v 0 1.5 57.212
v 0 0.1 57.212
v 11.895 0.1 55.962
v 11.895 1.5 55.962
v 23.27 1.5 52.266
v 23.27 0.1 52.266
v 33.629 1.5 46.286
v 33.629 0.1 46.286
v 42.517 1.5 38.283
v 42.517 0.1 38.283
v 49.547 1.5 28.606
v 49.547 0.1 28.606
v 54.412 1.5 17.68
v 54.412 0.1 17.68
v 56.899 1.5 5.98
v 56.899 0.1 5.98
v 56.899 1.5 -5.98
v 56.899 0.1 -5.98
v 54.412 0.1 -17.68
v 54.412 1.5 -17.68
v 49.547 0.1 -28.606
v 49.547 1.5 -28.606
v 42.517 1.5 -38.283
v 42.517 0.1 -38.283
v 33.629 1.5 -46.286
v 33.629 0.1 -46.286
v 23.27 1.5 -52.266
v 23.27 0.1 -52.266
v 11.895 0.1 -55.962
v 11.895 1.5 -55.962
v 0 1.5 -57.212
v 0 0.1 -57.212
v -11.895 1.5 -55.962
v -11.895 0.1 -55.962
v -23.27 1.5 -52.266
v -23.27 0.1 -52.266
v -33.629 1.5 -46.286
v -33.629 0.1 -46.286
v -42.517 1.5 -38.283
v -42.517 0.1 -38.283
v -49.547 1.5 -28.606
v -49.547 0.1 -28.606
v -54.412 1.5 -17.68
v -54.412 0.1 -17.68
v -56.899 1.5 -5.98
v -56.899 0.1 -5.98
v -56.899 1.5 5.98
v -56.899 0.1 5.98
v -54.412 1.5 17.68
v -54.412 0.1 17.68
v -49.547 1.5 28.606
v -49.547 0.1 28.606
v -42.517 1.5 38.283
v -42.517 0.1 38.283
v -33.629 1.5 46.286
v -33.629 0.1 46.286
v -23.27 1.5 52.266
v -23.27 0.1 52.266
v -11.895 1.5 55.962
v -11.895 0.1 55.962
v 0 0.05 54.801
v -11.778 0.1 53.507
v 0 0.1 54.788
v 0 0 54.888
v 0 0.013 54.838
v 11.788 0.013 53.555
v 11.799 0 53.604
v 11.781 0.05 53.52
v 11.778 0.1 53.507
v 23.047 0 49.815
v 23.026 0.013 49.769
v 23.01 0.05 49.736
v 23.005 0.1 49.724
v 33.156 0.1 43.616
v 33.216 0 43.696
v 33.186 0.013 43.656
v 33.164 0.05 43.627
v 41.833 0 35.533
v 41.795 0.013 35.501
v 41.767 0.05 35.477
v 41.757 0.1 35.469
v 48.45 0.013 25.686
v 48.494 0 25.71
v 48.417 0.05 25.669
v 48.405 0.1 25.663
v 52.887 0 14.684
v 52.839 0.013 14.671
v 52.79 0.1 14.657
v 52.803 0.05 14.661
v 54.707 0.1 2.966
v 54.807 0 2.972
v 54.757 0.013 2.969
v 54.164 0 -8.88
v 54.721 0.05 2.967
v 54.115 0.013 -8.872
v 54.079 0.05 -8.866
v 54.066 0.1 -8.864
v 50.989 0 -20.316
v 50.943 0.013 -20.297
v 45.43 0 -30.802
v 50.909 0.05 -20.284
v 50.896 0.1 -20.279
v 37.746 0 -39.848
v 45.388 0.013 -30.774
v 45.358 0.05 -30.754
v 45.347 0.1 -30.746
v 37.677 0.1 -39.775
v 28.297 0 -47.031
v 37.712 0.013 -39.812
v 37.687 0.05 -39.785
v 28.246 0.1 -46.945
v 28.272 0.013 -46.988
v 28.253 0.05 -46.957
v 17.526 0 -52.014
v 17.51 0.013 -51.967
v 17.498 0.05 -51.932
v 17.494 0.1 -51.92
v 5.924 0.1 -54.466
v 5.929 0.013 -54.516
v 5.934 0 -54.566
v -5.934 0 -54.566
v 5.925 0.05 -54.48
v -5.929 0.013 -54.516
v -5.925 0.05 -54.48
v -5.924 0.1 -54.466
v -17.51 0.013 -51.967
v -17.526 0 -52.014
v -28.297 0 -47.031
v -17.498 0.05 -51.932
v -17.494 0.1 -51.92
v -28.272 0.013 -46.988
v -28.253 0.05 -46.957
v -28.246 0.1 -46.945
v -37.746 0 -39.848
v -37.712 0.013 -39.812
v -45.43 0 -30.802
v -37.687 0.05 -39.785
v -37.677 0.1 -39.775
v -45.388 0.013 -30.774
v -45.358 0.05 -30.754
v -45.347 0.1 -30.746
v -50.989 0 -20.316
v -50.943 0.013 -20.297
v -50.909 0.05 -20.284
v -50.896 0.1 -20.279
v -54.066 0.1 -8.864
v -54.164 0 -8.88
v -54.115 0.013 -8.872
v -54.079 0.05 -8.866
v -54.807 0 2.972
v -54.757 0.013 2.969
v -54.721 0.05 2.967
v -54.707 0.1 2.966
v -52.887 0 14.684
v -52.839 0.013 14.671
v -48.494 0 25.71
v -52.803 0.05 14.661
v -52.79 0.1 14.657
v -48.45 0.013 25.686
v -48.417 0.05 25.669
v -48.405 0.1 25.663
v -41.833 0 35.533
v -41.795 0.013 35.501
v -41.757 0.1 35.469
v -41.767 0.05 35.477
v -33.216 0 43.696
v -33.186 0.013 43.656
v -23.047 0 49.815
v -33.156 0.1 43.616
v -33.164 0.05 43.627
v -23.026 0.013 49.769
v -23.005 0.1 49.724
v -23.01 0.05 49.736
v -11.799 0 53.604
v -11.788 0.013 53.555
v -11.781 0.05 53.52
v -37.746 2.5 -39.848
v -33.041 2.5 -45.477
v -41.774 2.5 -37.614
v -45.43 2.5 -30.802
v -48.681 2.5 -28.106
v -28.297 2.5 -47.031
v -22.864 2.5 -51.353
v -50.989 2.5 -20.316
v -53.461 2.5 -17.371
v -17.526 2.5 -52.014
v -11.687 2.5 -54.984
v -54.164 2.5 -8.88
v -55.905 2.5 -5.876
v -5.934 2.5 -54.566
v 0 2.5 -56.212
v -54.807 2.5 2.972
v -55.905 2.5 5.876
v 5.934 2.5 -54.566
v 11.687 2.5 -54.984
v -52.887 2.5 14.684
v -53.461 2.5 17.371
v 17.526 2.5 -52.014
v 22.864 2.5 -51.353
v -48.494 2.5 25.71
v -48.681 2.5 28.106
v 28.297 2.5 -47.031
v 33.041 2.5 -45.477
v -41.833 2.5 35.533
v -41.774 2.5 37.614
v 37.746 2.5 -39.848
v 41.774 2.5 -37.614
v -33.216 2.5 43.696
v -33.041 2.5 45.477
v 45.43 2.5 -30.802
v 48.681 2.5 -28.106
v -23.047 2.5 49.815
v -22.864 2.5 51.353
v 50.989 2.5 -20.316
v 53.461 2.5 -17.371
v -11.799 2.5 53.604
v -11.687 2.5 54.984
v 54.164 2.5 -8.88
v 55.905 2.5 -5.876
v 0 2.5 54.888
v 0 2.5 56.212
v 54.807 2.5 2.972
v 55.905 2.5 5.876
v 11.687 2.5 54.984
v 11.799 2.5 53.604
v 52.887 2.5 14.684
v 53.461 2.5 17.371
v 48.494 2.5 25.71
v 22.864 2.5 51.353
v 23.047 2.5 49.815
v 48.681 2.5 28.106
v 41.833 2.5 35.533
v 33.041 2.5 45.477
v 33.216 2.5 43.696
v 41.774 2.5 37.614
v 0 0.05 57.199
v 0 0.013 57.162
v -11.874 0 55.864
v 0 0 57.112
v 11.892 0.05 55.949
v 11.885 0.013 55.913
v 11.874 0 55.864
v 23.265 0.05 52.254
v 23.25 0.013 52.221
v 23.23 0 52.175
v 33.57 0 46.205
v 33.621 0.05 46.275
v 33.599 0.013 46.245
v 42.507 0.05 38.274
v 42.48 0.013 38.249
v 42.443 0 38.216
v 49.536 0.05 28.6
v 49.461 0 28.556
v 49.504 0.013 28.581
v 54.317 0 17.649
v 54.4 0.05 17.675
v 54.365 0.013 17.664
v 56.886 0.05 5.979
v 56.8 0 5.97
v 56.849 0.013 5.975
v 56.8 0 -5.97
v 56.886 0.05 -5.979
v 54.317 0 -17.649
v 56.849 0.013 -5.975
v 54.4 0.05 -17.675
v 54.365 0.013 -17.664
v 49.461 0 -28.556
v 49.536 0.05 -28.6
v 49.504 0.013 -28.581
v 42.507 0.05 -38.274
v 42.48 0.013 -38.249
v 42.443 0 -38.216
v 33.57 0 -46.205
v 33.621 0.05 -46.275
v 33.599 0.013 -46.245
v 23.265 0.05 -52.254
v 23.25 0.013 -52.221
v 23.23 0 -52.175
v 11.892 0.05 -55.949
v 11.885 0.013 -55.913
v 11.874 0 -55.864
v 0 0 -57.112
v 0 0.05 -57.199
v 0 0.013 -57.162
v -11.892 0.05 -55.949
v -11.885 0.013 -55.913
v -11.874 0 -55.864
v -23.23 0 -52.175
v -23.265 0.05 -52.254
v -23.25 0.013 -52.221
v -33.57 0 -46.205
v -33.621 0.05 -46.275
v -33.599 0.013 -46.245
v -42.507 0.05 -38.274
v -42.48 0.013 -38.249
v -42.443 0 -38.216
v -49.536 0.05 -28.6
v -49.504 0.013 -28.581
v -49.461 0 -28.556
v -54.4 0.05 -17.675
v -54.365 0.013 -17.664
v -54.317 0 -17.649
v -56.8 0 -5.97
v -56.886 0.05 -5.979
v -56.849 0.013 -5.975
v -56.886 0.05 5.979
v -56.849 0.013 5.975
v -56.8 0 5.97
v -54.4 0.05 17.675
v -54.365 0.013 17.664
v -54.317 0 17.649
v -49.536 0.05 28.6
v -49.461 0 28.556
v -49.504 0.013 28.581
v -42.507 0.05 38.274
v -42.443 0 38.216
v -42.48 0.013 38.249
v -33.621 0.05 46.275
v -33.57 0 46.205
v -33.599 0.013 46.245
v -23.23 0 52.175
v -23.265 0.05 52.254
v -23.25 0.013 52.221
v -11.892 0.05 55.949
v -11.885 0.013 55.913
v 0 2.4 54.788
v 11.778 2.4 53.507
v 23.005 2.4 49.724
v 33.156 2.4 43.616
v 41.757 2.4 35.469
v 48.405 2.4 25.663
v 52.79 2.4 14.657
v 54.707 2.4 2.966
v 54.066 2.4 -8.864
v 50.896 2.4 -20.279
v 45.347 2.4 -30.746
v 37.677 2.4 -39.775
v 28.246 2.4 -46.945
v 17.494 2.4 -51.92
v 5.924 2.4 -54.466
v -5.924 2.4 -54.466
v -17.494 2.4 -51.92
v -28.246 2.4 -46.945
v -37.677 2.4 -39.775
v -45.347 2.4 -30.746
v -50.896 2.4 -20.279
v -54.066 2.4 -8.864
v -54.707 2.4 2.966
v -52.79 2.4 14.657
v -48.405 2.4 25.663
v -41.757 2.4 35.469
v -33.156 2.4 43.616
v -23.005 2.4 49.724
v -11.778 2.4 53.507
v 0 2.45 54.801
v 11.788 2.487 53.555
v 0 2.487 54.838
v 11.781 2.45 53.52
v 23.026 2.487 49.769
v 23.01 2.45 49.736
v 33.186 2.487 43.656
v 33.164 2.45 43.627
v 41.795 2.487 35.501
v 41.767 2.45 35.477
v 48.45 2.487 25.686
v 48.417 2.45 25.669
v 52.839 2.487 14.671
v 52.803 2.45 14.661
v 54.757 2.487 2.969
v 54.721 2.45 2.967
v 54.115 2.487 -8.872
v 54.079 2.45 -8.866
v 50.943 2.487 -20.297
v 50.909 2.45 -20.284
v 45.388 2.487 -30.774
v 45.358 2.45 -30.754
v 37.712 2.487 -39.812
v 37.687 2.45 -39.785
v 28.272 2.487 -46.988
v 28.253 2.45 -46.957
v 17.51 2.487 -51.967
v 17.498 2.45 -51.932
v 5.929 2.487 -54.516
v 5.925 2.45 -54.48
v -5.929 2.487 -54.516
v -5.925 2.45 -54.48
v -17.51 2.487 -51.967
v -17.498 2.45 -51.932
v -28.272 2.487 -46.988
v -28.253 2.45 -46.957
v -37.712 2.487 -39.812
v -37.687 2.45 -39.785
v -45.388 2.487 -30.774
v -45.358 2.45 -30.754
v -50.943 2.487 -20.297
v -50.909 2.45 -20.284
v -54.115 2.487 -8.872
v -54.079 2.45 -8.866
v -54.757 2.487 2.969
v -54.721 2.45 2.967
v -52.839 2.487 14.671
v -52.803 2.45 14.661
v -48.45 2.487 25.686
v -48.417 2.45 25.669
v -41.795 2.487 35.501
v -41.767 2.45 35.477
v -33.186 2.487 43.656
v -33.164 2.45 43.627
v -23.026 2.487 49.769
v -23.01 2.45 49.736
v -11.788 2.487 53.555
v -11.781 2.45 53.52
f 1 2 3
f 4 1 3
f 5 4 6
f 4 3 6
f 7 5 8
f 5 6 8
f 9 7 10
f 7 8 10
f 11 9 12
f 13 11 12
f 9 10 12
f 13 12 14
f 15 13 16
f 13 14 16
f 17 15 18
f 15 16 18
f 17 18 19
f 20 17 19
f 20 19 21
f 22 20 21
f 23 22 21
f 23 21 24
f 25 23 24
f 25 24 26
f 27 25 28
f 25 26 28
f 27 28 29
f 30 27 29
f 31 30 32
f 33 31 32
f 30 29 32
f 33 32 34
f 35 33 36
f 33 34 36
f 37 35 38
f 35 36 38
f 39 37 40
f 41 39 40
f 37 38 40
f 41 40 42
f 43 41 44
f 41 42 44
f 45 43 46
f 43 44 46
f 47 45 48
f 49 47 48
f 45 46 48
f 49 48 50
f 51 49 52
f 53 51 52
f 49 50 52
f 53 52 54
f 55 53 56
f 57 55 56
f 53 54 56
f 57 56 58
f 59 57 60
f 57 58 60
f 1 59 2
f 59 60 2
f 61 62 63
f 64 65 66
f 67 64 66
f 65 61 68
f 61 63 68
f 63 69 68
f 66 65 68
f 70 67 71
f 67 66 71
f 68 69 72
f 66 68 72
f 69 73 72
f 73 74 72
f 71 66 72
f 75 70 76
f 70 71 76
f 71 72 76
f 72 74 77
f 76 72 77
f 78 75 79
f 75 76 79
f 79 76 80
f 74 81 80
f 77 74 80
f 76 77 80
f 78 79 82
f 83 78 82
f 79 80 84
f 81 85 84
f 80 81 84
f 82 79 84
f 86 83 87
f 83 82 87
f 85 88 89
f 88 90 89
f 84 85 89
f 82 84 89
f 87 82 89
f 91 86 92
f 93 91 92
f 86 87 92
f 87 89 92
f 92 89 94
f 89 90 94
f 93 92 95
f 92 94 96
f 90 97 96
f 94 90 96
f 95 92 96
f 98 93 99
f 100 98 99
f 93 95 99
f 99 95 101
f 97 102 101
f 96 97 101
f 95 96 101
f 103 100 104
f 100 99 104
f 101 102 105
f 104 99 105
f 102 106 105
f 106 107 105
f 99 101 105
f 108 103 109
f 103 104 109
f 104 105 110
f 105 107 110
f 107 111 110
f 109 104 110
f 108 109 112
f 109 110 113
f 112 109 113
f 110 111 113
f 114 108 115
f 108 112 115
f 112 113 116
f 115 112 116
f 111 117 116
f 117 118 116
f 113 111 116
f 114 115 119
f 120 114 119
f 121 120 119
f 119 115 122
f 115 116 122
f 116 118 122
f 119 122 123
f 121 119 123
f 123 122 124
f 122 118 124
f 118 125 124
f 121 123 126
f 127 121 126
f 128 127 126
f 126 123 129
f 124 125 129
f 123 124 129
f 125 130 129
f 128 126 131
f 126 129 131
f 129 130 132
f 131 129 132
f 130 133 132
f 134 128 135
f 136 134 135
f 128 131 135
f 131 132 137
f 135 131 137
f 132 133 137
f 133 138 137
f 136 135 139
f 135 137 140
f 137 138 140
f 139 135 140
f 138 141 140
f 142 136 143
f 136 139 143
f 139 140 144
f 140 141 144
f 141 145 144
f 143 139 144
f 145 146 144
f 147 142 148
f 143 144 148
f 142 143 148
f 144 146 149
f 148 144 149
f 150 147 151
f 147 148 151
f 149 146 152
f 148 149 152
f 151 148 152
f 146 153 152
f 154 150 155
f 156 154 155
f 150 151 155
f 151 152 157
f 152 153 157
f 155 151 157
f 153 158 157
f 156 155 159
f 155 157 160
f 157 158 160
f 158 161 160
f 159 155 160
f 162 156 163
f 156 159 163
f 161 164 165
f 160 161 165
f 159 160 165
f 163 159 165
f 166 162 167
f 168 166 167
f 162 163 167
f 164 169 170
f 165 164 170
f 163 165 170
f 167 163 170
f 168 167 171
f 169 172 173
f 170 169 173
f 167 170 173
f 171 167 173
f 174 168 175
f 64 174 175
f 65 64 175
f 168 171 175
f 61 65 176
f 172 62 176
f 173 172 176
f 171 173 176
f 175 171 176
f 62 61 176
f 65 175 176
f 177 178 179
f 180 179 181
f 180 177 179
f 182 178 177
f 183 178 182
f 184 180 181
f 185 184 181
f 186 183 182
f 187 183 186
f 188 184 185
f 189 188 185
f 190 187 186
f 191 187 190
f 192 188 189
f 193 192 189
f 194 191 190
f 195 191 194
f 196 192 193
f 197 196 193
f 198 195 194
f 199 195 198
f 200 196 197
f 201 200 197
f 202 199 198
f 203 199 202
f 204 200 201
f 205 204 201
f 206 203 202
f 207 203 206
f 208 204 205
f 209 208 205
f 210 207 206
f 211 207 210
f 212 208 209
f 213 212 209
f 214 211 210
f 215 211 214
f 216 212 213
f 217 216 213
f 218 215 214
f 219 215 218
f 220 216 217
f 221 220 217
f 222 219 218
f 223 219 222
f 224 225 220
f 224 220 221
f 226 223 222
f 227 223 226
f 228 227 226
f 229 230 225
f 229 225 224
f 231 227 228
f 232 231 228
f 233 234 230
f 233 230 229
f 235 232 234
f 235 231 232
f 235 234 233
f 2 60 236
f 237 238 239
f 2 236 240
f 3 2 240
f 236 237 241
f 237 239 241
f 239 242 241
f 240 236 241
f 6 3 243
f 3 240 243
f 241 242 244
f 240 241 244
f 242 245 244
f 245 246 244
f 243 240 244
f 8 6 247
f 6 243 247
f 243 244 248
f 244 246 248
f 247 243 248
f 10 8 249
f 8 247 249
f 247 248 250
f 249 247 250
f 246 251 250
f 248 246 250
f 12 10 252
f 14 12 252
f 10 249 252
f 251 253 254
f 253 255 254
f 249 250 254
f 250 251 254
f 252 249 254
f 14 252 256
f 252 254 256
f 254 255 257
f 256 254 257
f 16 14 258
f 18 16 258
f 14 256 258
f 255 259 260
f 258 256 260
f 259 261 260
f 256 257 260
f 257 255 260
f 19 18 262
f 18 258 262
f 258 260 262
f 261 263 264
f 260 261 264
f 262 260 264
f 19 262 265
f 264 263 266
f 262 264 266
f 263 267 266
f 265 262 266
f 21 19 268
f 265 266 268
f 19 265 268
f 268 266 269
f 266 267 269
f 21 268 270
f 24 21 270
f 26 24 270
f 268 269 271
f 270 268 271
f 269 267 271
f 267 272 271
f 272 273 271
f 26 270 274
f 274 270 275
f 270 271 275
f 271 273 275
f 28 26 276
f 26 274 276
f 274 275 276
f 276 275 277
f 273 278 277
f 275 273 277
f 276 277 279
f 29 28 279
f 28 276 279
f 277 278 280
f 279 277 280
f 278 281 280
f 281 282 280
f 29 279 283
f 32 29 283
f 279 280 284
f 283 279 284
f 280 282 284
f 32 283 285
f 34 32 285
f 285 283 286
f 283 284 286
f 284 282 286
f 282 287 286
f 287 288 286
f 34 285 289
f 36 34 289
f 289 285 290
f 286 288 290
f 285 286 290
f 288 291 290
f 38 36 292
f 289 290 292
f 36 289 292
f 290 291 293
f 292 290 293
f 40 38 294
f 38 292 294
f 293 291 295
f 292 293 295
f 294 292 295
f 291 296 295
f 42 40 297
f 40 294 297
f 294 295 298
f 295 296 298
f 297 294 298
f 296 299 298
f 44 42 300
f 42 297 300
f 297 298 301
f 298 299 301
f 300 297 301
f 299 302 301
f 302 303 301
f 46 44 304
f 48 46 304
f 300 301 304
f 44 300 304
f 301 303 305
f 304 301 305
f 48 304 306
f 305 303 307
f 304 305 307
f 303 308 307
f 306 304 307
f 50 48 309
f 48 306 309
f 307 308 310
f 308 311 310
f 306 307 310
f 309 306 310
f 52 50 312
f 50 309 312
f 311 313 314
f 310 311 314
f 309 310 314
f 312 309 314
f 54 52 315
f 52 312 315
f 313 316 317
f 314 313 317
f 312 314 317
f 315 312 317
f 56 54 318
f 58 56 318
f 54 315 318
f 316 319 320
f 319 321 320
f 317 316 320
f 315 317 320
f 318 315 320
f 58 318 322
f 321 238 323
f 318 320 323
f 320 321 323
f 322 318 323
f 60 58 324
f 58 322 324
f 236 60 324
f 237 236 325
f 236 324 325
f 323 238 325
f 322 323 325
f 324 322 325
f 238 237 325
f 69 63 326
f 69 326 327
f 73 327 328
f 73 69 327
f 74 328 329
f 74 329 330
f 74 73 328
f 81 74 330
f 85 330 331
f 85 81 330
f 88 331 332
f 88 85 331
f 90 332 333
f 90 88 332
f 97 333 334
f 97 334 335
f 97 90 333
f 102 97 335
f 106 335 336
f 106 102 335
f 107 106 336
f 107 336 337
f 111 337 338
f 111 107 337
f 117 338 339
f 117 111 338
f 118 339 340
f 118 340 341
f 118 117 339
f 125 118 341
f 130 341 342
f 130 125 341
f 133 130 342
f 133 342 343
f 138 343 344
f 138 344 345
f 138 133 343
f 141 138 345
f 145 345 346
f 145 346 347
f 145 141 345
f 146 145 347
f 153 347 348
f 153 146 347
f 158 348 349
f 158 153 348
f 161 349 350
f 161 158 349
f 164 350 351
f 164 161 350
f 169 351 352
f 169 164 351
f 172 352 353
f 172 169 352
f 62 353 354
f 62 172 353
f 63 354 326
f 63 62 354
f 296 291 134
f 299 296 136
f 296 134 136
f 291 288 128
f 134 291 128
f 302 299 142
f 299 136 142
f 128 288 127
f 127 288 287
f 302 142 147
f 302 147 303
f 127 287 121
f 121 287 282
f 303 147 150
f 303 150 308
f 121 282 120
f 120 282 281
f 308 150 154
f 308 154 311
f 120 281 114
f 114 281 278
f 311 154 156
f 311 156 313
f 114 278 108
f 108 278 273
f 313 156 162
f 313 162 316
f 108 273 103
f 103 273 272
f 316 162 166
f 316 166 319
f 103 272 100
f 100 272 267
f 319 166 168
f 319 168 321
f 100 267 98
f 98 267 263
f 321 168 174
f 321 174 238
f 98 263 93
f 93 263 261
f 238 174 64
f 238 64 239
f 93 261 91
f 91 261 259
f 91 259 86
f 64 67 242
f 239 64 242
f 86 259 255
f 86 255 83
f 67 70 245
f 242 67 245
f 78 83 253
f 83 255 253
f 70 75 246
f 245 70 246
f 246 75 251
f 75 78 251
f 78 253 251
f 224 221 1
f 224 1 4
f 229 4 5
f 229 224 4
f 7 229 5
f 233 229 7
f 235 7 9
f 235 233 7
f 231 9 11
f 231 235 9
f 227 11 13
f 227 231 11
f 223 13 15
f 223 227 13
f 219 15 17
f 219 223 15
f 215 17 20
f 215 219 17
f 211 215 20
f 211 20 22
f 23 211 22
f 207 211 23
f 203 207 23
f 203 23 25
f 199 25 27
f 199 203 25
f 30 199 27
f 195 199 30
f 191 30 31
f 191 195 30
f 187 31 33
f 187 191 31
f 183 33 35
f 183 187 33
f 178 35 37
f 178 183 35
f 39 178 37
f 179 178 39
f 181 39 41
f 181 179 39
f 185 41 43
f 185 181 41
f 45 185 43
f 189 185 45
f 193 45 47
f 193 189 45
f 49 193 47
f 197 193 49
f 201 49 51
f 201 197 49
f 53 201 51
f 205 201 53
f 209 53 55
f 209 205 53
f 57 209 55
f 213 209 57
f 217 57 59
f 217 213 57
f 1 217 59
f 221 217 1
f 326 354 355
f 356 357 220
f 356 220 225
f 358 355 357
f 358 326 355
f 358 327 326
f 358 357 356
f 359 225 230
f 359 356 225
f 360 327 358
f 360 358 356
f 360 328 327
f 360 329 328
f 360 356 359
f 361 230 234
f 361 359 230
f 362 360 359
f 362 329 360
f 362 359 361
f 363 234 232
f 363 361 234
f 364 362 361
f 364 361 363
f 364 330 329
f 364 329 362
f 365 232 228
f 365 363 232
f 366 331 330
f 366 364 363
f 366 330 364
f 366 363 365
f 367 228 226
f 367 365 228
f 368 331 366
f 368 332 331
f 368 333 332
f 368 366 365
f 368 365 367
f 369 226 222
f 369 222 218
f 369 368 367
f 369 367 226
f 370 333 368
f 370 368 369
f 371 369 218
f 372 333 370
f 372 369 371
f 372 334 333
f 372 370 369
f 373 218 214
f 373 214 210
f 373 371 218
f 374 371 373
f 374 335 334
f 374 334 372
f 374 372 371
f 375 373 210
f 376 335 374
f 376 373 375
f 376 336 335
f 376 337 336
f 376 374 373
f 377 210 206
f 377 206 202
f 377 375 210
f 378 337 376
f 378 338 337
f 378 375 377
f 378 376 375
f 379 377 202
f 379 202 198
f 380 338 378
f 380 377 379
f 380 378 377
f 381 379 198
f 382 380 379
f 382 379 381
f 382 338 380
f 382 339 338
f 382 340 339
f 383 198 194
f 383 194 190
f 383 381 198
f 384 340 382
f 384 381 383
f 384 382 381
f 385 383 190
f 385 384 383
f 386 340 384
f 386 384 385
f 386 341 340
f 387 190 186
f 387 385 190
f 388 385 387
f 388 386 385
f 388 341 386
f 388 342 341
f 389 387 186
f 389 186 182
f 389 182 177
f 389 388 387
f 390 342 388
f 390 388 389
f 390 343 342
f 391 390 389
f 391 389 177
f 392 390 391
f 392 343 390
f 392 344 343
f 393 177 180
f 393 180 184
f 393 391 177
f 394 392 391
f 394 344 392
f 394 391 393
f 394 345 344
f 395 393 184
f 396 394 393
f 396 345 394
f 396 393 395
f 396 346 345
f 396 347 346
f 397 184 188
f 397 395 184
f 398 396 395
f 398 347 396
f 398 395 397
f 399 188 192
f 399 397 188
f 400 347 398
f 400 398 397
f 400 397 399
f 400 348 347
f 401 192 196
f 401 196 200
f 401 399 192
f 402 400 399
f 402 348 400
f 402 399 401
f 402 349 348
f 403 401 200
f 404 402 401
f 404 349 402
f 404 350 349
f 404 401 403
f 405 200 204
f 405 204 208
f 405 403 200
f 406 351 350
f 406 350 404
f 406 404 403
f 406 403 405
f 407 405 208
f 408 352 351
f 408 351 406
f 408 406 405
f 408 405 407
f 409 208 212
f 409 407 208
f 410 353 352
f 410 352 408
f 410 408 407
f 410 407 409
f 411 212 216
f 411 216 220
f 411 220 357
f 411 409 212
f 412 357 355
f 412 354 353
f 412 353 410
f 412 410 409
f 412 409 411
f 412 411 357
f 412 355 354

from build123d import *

# Parameters (mm, degrees)
SKETCH1_R           = 57.2125
SKETCH1_R_2         = 54.7875
BOSS_EXTRUDE1_DEPTH = 2.5
CHAMFER1_SIZE       = 1
FILLET1_R           = 0.1


with BuildPart() as part:
    # Sketch1 → Boss-Extrude1 (new body)
    with BuildSketch(Plane(origin=(0, 0, 0), x_dir=(1, 0, 0), z_dir=(0, 1, 0))):
        with Locations(Location((0, 0, 0), (0, 0, 270))):
            Circle(SKETCH1_R)
        with Locations(Location((0, 0, 0), (0, 0, 270))):
            Circle(SKETCH1_R_2, mode=Mode.SUBTRACT)
    extrude(amount=BOSS_EXTRUDE1_DEPTH)

    # Chamfer1
    chamfer1_edges = [part.edges().sort_by_distance(p)[0] for p in [
        (0, 2.5, -57.2125),
    ]]
    chamfer(chamfer1_edges, length=CHAMFER1_SIZE)

    # Fillet1
    fillet1_edges = [part.edges().sort_by_distance(p)[0] for p in [
        (0, 0, -57.2125),
        (0, 0, -54.7875),
        (0, 2.5, -54.7875),
    ]]
    fillet(fillet1_edges, radius=FILLET1_R)


solid = part.part
